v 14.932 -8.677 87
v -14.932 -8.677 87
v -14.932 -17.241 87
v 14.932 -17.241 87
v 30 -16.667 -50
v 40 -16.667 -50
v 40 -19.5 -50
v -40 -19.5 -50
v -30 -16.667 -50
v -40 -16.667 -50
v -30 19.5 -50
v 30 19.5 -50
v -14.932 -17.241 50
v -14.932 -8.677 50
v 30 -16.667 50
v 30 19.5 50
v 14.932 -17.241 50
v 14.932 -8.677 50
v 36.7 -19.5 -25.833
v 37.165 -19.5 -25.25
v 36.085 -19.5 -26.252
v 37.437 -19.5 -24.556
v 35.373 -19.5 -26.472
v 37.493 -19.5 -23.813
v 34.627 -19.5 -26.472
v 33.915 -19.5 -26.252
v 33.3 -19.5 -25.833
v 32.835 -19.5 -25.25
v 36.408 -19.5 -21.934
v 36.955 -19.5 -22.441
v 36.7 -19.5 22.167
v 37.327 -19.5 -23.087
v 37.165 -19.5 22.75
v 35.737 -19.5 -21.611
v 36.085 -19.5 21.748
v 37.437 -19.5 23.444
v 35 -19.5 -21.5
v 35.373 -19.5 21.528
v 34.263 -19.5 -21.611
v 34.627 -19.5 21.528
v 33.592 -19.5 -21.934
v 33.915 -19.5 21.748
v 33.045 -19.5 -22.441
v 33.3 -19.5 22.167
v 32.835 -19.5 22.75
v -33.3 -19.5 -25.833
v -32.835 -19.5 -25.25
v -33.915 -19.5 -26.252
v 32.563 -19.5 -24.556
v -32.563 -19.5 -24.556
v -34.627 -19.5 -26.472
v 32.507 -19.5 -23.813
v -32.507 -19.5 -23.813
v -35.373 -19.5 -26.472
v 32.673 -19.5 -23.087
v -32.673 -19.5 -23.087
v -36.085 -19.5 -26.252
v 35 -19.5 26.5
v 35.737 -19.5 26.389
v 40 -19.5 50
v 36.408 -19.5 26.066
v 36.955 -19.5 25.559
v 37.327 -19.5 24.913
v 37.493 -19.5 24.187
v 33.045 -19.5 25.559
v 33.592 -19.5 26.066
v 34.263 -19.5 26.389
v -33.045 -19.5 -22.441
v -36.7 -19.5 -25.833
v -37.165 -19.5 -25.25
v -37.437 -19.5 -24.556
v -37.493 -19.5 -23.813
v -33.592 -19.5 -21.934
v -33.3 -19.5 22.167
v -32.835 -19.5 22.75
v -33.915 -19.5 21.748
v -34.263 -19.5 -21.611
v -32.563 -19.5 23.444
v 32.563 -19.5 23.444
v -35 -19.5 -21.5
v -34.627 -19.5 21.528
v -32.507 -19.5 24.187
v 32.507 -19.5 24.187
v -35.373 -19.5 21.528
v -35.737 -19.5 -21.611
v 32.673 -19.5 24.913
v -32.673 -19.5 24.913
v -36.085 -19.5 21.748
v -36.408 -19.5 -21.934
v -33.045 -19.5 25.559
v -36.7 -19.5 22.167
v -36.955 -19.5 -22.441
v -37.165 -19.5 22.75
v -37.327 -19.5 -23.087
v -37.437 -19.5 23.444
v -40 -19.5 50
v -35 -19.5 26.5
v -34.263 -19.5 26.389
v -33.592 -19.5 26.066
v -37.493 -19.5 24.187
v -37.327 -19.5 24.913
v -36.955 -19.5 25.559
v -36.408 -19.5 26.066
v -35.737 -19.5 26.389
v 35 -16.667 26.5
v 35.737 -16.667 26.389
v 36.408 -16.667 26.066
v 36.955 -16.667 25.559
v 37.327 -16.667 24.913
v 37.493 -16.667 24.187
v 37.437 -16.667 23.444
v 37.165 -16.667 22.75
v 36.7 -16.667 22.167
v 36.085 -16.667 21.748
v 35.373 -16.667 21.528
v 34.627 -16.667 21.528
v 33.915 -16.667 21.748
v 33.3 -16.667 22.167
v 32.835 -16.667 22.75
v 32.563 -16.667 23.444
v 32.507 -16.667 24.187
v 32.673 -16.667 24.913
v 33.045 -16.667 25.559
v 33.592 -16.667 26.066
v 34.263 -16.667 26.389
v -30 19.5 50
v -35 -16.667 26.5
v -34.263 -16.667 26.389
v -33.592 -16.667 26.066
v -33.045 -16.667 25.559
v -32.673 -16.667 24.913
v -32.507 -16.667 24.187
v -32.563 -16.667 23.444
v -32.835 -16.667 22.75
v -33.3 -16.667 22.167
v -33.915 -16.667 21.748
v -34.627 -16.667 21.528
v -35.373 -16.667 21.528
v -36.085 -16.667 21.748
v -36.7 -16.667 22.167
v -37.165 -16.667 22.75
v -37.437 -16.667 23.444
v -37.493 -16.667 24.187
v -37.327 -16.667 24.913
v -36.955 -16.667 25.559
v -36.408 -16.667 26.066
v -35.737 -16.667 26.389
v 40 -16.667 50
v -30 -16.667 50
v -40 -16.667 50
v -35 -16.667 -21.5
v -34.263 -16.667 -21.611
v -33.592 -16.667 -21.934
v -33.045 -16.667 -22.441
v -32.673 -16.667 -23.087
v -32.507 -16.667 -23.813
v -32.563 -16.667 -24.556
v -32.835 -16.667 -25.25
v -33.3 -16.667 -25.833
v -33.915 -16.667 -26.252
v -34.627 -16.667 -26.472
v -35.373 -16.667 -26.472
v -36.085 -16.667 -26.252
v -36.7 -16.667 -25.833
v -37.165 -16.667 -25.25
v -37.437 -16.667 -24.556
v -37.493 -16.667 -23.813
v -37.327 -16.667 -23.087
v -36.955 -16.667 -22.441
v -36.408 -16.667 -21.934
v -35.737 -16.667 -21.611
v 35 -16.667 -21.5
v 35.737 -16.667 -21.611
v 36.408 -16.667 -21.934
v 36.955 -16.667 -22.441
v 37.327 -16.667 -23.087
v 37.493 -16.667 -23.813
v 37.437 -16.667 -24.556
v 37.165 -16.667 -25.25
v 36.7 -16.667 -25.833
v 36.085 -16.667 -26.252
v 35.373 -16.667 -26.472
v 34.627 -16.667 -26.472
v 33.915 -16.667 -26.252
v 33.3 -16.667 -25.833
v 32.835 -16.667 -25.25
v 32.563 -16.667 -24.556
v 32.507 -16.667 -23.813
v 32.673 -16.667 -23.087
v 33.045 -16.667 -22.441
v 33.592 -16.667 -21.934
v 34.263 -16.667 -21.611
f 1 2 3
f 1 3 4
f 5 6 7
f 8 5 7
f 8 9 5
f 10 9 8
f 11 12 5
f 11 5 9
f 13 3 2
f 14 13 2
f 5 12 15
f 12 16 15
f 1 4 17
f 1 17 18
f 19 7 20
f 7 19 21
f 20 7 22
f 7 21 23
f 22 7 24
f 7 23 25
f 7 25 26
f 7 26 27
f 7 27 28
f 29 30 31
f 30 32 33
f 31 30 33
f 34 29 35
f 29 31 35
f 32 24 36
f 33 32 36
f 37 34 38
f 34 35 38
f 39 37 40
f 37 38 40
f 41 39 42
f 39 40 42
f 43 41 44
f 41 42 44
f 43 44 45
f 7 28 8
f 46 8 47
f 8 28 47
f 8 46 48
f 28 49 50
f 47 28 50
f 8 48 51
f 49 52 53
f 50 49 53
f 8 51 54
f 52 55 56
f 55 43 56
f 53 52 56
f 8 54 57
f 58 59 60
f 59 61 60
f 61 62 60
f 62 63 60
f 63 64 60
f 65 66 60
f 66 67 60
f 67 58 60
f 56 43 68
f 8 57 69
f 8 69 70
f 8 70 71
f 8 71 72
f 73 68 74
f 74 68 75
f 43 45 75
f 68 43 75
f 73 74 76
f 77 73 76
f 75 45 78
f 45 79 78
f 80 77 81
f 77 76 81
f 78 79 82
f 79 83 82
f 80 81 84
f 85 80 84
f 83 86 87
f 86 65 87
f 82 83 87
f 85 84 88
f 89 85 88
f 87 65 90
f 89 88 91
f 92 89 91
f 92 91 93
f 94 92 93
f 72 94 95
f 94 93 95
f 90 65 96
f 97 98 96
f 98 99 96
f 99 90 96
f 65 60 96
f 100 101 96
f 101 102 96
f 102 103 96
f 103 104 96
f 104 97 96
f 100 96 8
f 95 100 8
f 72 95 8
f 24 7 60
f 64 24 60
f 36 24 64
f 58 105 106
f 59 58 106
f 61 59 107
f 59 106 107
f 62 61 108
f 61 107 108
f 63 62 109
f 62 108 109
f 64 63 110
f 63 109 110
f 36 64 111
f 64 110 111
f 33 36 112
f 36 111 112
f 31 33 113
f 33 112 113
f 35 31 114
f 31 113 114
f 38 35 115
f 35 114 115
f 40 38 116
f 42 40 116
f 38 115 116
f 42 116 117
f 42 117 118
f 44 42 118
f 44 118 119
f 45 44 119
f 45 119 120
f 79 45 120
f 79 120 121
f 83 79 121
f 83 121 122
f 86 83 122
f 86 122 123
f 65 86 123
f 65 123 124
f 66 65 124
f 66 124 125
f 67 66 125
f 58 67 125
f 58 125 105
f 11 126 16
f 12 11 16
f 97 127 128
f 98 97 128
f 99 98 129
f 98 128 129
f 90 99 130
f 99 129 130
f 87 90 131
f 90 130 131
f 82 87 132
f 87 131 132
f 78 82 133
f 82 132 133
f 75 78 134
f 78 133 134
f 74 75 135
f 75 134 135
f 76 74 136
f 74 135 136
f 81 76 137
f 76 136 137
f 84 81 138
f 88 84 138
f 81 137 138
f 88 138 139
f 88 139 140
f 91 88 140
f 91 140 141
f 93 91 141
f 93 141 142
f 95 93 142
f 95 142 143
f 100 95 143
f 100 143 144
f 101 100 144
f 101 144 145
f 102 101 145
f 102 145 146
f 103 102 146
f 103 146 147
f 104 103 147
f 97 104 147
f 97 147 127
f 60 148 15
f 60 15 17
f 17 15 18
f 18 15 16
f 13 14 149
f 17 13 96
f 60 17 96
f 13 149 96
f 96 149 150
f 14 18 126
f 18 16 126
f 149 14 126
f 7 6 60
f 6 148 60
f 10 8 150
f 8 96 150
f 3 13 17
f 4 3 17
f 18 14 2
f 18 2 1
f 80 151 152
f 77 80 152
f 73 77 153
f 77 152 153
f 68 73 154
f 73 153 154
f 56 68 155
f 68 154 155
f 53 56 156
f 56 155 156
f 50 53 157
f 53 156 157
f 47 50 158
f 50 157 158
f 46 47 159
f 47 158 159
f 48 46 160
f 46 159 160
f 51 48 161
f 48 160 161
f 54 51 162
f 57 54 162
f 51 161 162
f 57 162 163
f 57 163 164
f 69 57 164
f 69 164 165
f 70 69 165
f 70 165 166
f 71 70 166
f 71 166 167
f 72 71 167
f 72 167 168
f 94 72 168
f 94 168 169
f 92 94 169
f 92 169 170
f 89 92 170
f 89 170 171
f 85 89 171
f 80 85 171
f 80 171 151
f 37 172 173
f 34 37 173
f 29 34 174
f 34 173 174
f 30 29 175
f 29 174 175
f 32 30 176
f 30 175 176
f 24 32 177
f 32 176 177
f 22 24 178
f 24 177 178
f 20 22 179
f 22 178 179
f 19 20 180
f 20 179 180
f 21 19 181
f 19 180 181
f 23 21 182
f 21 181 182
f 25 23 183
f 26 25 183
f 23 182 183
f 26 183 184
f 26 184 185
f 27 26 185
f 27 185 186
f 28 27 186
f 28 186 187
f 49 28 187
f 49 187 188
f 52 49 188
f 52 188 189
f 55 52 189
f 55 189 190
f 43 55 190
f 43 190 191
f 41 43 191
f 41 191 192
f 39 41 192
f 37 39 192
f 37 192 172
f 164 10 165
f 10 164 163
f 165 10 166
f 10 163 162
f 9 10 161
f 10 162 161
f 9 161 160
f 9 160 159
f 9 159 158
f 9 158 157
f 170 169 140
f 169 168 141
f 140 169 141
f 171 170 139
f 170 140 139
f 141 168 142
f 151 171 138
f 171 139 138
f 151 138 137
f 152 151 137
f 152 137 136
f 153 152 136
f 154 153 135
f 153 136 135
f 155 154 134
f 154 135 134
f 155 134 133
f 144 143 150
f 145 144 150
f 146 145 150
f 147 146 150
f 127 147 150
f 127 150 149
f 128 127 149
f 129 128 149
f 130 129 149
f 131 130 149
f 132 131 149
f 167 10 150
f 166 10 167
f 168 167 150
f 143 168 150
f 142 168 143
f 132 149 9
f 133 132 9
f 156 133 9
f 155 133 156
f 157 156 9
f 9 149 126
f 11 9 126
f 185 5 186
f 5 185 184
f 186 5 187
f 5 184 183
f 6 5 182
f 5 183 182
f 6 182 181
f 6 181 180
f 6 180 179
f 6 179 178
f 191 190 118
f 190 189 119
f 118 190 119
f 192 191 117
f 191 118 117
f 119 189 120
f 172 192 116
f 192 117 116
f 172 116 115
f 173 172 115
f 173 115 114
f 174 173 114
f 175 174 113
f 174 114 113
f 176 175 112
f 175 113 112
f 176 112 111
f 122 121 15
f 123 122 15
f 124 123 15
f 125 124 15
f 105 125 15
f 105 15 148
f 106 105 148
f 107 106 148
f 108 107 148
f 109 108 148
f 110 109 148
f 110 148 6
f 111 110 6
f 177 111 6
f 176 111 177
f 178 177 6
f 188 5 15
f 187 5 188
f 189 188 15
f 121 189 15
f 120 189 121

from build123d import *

# Parameters (mm, degrees)
EXTRUDE_1_DEPTH     = 50
SKETCH_3_R          = 2.5
CUT_EXTRUDE_1_DEPTH = 74.539294107
SKETCH_4_W          = 29.863739494
SKETCH_4_H          = 8.563866473
EXTRUDE_2_DEPTH     = 37


with BuildPart() as part:
    # 草图2 → 凸台-拉伸1 (new, symmetric)
    with BuildSketch(Plane.XY):
        Polygon((-30, 19.5), (30, 19.5), (30, -16.666666667), (40, -16.666666667), (40, -19.5), (-40, -19.5), (-40, -16.666666667), (-30, -16.666666667), align=None)
    extrude(amount=EXTRUDE_1_DEPTH, both=True)

    # 草图3 → 切除-拉伸1 (cut, through all)
    with BuildSketch(Plane(origin=(0, -16.666666667, 0), x_dir=(1, 0, 0), z_dir=(0, 1, 0))):
        with Locations(Location((-35, 24, 0), (0, 0, 270))):
            Circle(SKETCH_3_R)
        with Locations(Location((35, 24, 0), (0, 0, 270))):
            Circle(SKETCH_3_R)
        with Locations(Location((-35, -24, 0), (0, 0, 270))):
            Circle(SKETCH_3_R)
        with Locations(Location((35, -24, 0), (0, 0, 270))):
            Circle(SKETCH_3_R)
    extrude(amount=-CUT_EXTRUDE_1_DEPTH, mode=Mode.SUBTRACT)

    # 草图4 → 凸台-拉伸2 (add)
    with BuildSketch(Plane.XY.offset(50)):
        with Locations((0, -12.959263215)):
            Rectangle(SKETCH_4_W, SKETCH_4_H)
    extrude(amount=EXTRUDE_2_DEPTH)


solid = part.part
